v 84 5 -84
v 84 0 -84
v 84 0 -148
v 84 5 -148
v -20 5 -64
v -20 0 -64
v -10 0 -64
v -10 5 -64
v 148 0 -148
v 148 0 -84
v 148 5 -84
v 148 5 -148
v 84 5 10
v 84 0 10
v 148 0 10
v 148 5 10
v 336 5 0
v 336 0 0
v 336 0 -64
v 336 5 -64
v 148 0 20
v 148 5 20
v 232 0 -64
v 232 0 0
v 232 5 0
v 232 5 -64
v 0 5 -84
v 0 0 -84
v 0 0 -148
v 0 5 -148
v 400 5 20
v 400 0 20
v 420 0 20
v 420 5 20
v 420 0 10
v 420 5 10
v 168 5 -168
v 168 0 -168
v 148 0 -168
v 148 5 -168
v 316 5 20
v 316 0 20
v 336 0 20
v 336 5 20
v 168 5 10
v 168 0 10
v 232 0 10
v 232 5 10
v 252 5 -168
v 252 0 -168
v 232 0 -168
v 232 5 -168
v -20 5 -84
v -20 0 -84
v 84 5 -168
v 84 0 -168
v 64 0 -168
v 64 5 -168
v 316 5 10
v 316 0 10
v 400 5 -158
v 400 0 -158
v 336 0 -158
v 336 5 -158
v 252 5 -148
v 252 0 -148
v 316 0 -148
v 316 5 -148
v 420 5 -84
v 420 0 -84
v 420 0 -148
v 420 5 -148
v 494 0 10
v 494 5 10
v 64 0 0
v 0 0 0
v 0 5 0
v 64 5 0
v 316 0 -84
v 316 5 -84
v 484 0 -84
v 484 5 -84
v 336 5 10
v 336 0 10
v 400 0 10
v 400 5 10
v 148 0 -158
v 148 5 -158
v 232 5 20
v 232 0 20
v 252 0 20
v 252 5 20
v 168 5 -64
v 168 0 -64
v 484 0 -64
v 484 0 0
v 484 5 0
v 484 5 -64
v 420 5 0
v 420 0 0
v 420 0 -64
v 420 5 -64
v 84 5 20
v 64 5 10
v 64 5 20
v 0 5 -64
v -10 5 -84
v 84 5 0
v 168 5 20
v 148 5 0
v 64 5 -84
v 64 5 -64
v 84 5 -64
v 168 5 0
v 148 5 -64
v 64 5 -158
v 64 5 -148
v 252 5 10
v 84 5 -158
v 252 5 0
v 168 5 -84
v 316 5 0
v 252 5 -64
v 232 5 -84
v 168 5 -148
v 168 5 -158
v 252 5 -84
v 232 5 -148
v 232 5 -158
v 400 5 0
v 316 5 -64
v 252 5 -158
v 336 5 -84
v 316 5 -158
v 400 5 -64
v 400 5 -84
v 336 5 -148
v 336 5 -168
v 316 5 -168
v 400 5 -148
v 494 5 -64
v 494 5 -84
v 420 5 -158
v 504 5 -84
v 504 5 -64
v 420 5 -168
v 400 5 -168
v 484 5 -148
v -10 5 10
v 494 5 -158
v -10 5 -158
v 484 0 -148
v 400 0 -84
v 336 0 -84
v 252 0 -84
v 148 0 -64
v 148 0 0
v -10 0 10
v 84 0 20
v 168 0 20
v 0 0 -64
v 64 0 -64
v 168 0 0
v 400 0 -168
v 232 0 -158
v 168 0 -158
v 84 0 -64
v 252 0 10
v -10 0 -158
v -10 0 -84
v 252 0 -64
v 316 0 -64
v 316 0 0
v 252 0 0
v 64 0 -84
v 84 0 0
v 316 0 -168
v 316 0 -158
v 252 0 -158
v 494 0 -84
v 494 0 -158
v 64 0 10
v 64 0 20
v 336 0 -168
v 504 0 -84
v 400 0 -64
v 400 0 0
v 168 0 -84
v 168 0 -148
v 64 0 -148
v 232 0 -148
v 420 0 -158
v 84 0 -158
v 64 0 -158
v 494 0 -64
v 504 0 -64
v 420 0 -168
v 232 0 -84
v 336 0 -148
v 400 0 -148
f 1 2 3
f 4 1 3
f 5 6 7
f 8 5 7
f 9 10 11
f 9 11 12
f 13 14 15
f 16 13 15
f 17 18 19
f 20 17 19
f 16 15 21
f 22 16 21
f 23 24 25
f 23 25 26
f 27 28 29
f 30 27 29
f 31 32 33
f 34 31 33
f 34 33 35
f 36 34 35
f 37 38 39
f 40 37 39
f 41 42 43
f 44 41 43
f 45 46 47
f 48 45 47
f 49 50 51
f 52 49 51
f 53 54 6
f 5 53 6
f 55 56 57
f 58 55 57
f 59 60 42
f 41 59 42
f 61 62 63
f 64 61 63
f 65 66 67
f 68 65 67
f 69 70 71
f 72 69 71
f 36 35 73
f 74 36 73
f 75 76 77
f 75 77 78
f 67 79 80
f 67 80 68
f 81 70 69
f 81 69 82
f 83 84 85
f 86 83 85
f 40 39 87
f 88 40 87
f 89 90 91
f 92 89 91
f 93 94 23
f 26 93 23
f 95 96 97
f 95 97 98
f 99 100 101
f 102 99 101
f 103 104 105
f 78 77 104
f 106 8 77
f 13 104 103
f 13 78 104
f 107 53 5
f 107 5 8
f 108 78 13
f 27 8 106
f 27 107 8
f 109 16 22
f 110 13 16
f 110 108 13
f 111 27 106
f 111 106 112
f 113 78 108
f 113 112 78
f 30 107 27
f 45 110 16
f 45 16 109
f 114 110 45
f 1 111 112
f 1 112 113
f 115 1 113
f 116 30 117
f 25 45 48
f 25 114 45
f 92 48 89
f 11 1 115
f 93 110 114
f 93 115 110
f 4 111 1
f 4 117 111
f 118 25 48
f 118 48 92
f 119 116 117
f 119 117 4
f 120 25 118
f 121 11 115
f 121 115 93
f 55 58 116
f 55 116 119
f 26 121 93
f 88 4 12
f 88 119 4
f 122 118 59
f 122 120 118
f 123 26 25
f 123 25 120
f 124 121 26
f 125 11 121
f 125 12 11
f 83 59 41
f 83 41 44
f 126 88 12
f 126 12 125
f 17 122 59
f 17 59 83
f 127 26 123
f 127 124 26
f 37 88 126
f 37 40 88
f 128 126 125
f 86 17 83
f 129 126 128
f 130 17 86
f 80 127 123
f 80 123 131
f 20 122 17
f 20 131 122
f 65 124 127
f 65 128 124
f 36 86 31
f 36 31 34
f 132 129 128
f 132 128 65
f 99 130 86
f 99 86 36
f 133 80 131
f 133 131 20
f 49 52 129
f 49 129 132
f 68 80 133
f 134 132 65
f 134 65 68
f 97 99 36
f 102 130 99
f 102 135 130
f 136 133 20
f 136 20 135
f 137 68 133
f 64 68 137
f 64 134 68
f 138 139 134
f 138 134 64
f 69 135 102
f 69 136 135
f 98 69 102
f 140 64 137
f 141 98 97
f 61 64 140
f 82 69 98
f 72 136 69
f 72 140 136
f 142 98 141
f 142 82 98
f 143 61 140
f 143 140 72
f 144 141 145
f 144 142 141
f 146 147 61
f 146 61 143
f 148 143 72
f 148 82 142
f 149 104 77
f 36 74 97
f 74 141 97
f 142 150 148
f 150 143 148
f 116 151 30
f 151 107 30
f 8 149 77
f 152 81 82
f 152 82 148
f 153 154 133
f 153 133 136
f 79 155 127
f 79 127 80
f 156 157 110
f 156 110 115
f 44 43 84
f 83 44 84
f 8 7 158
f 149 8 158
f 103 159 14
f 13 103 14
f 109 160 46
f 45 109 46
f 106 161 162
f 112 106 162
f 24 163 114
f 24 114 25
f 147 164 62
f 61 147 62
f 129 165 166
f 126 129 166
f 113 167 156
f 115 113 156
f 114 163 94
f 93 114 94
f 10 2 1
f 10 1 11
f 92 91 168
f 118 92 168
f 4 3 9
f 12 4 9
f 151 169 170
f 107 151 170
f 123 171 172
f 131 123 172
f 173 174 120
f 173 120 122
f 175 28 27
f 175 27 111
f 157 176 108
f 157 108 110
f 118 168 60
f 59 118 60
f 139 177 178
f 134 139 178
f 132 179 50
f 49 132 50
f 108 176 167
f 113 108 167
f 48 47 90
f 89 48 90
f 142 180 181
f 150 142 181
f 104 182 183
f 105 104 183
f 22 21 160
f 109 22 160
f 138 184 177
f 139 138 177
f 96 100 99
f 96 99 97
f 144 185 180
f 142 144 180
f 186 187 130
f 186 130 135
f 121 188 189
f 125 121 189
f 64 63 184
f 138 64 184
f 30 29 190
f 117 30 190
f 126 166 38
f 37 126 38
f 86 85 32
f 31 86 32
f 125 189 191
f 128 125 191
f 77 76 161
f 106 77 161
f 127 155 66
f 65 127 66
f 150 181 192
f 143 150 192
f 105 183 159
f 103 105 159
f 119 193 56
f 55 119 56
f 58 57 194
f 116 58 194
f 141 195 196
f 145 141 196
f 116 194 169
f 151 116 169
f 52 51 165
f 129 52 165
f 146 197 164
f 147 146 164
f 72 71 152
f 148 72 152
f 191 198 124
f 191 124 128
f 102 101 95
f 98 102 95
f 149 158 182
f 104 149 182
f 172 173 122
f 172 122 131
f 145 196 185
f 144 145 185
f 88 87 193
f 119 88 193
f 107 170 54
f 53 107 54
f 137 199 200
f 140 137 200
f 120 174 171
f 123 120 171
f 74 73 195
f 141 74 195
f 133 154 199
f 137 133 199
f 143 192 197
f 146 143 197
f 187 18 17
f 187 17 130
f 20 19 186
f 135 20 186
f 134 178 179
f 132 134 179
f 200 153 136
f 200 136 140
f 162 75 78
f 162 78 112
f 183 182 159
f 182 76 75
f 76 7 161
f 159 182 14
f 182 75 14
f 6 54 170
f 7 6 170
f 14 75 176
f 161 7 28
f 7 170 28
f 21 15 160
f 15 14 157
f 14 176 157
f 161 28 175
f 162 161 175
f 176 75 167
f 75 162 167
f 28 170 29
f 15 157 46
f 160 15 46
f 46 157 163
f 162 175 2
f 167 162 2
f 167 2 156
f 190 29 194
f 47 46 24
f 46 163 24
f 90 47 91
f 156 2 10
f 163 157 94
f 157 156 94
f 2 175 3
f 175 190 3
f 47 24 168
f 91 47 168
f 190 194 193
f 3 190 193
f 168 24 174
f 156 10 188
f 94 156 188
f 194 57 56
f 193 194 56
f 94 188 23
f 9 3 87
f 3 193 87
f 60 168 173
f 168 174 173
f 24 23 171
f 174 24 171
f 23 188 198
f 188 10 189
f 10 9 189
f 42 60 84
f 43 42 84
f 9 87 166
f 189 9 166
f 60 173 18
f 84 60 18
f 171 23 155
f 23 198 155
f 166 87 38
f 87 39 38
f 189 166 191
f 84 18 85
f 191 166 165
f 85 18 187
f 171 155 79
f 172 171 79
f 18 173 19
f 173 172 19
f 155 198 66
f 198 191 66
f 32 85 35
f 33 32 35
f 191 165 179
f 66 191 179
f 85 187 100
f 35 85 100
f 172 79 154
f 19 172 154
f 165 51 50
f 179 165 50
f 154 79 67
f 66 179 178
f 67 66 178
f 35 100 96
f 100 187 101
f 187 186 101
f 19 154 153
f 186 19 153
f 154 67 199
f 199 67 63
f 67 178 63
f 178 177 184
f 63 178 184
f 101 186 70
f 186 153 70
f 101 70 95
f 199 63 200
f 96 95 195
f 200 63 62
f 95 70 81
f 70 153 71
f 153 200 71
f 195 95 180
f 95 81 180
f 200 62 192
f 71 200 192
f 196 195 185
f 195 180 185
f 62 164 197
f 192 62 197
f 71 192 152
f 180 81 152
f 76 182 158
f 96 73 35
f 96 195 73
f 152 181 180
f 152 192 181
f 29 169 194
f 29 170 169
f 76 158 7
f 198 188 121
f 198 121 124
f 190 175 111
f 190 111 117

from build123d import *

# Parameters (mm, degrees)
CROQUIS1_W              = 64
CROQUIS1_H              = 64
SALIENTE_EXTRUIR1_DEPTH = 5


with BuildPart() as part:
    # Croquis1 → Saliente-Extruir1 (new body)
    with BuildSketch(Plane(origin=(0, 0, 0), x_dir=(1, 0, 0), z_dir=(0, 1, 0))):
        Polygon((-10, -10), (64, -10), (64, -20), (84, -20), (84, -10), (148, -10), (148, -20), (168, -20), (168, -10), (232, -10), (232, -20), (252, -20), (252, -10), (316, -10), (316, -20), (336, -20), (336, -10), (400, -10), (400, -20), (420, -20), (420, -10), (494, -10), (494, 64), (504, 64), (504, 84), (494, 84), (494, 158), (420, 158), (420, 168), (400, 168), (400, 158), (336, 158), (336, 168), (316, 168), (316, 158), (252, 158), (252, 168), (232, 168), (232, 158), (168, 158), (168, 168), (148, 168), (148, 158), (84, 158), (84, 168), (64, 168), (64, 158), (-10, 158), (-10, 84), (-20, 84), (-20, 64), (-10, 64), align=None)
        with Locations((32, 32)):
            Rectangle(CROQUIS1_W, CROQUIS1_H, mode=Mode.SUBTRACT)
        with Locations((116, 32)):
            Rectangle(CROQUIS1_W, CROQUIS1_H, mode=Mode.SUBTRACT)
        with Locations((200, 32)):
            Rectangle(CROQUIS1_W, CROQUIS1_H, mode=Mode.SUBTRACT)
        with Locations((284, 32)):
            Rectangle(CROQUIS1_W, CROQUIS1_H, mode=Mode.SUBTRACT)
        with Locations((368, 32)):
            Rectangle(CROQUIS1_W, CROQUIS1_H, mode=Mode.SUBTRACT)
        with Locations((452, 32)):
            Rectangle(CROQUIS1_W, CROQUIS1_H, mode=Mode.SUBTRACT)
        with Locations((116, 116)):
            Rectangle(CROQUIS1_W, CROQUIS1_H, mode=Mode.SUBTRACT)
        with Locations((200, 116)):
            Rectangle(CROQUIS1_W, CROQUIS1_H, mode=Mode.SUBTRACT)
        with Locations((284, 116)):
            Rectangle(CROQUIS1_W, CROQUIS1_H, mode=Mode.SUBTRACT)
        with Locations((368, 116)):
            Rectangle(CROQUIS1_W, CROQUIS1_H, mode=Mode.SUBTRACT)
        with Locations((452, 116)):
            Rectangle(CROQUIS1_W, CROQUIS1_H, mode=Mode.SUBTRACT)
        with Locations((32, 116)):
            Rectangle(CROQUIS1_W, CROQUIS1_H, mode=Mode.SUBTRACT)
    extrude(amount=SALIENTE_EXTRUIR1_DEPTH)


solid = part.part
